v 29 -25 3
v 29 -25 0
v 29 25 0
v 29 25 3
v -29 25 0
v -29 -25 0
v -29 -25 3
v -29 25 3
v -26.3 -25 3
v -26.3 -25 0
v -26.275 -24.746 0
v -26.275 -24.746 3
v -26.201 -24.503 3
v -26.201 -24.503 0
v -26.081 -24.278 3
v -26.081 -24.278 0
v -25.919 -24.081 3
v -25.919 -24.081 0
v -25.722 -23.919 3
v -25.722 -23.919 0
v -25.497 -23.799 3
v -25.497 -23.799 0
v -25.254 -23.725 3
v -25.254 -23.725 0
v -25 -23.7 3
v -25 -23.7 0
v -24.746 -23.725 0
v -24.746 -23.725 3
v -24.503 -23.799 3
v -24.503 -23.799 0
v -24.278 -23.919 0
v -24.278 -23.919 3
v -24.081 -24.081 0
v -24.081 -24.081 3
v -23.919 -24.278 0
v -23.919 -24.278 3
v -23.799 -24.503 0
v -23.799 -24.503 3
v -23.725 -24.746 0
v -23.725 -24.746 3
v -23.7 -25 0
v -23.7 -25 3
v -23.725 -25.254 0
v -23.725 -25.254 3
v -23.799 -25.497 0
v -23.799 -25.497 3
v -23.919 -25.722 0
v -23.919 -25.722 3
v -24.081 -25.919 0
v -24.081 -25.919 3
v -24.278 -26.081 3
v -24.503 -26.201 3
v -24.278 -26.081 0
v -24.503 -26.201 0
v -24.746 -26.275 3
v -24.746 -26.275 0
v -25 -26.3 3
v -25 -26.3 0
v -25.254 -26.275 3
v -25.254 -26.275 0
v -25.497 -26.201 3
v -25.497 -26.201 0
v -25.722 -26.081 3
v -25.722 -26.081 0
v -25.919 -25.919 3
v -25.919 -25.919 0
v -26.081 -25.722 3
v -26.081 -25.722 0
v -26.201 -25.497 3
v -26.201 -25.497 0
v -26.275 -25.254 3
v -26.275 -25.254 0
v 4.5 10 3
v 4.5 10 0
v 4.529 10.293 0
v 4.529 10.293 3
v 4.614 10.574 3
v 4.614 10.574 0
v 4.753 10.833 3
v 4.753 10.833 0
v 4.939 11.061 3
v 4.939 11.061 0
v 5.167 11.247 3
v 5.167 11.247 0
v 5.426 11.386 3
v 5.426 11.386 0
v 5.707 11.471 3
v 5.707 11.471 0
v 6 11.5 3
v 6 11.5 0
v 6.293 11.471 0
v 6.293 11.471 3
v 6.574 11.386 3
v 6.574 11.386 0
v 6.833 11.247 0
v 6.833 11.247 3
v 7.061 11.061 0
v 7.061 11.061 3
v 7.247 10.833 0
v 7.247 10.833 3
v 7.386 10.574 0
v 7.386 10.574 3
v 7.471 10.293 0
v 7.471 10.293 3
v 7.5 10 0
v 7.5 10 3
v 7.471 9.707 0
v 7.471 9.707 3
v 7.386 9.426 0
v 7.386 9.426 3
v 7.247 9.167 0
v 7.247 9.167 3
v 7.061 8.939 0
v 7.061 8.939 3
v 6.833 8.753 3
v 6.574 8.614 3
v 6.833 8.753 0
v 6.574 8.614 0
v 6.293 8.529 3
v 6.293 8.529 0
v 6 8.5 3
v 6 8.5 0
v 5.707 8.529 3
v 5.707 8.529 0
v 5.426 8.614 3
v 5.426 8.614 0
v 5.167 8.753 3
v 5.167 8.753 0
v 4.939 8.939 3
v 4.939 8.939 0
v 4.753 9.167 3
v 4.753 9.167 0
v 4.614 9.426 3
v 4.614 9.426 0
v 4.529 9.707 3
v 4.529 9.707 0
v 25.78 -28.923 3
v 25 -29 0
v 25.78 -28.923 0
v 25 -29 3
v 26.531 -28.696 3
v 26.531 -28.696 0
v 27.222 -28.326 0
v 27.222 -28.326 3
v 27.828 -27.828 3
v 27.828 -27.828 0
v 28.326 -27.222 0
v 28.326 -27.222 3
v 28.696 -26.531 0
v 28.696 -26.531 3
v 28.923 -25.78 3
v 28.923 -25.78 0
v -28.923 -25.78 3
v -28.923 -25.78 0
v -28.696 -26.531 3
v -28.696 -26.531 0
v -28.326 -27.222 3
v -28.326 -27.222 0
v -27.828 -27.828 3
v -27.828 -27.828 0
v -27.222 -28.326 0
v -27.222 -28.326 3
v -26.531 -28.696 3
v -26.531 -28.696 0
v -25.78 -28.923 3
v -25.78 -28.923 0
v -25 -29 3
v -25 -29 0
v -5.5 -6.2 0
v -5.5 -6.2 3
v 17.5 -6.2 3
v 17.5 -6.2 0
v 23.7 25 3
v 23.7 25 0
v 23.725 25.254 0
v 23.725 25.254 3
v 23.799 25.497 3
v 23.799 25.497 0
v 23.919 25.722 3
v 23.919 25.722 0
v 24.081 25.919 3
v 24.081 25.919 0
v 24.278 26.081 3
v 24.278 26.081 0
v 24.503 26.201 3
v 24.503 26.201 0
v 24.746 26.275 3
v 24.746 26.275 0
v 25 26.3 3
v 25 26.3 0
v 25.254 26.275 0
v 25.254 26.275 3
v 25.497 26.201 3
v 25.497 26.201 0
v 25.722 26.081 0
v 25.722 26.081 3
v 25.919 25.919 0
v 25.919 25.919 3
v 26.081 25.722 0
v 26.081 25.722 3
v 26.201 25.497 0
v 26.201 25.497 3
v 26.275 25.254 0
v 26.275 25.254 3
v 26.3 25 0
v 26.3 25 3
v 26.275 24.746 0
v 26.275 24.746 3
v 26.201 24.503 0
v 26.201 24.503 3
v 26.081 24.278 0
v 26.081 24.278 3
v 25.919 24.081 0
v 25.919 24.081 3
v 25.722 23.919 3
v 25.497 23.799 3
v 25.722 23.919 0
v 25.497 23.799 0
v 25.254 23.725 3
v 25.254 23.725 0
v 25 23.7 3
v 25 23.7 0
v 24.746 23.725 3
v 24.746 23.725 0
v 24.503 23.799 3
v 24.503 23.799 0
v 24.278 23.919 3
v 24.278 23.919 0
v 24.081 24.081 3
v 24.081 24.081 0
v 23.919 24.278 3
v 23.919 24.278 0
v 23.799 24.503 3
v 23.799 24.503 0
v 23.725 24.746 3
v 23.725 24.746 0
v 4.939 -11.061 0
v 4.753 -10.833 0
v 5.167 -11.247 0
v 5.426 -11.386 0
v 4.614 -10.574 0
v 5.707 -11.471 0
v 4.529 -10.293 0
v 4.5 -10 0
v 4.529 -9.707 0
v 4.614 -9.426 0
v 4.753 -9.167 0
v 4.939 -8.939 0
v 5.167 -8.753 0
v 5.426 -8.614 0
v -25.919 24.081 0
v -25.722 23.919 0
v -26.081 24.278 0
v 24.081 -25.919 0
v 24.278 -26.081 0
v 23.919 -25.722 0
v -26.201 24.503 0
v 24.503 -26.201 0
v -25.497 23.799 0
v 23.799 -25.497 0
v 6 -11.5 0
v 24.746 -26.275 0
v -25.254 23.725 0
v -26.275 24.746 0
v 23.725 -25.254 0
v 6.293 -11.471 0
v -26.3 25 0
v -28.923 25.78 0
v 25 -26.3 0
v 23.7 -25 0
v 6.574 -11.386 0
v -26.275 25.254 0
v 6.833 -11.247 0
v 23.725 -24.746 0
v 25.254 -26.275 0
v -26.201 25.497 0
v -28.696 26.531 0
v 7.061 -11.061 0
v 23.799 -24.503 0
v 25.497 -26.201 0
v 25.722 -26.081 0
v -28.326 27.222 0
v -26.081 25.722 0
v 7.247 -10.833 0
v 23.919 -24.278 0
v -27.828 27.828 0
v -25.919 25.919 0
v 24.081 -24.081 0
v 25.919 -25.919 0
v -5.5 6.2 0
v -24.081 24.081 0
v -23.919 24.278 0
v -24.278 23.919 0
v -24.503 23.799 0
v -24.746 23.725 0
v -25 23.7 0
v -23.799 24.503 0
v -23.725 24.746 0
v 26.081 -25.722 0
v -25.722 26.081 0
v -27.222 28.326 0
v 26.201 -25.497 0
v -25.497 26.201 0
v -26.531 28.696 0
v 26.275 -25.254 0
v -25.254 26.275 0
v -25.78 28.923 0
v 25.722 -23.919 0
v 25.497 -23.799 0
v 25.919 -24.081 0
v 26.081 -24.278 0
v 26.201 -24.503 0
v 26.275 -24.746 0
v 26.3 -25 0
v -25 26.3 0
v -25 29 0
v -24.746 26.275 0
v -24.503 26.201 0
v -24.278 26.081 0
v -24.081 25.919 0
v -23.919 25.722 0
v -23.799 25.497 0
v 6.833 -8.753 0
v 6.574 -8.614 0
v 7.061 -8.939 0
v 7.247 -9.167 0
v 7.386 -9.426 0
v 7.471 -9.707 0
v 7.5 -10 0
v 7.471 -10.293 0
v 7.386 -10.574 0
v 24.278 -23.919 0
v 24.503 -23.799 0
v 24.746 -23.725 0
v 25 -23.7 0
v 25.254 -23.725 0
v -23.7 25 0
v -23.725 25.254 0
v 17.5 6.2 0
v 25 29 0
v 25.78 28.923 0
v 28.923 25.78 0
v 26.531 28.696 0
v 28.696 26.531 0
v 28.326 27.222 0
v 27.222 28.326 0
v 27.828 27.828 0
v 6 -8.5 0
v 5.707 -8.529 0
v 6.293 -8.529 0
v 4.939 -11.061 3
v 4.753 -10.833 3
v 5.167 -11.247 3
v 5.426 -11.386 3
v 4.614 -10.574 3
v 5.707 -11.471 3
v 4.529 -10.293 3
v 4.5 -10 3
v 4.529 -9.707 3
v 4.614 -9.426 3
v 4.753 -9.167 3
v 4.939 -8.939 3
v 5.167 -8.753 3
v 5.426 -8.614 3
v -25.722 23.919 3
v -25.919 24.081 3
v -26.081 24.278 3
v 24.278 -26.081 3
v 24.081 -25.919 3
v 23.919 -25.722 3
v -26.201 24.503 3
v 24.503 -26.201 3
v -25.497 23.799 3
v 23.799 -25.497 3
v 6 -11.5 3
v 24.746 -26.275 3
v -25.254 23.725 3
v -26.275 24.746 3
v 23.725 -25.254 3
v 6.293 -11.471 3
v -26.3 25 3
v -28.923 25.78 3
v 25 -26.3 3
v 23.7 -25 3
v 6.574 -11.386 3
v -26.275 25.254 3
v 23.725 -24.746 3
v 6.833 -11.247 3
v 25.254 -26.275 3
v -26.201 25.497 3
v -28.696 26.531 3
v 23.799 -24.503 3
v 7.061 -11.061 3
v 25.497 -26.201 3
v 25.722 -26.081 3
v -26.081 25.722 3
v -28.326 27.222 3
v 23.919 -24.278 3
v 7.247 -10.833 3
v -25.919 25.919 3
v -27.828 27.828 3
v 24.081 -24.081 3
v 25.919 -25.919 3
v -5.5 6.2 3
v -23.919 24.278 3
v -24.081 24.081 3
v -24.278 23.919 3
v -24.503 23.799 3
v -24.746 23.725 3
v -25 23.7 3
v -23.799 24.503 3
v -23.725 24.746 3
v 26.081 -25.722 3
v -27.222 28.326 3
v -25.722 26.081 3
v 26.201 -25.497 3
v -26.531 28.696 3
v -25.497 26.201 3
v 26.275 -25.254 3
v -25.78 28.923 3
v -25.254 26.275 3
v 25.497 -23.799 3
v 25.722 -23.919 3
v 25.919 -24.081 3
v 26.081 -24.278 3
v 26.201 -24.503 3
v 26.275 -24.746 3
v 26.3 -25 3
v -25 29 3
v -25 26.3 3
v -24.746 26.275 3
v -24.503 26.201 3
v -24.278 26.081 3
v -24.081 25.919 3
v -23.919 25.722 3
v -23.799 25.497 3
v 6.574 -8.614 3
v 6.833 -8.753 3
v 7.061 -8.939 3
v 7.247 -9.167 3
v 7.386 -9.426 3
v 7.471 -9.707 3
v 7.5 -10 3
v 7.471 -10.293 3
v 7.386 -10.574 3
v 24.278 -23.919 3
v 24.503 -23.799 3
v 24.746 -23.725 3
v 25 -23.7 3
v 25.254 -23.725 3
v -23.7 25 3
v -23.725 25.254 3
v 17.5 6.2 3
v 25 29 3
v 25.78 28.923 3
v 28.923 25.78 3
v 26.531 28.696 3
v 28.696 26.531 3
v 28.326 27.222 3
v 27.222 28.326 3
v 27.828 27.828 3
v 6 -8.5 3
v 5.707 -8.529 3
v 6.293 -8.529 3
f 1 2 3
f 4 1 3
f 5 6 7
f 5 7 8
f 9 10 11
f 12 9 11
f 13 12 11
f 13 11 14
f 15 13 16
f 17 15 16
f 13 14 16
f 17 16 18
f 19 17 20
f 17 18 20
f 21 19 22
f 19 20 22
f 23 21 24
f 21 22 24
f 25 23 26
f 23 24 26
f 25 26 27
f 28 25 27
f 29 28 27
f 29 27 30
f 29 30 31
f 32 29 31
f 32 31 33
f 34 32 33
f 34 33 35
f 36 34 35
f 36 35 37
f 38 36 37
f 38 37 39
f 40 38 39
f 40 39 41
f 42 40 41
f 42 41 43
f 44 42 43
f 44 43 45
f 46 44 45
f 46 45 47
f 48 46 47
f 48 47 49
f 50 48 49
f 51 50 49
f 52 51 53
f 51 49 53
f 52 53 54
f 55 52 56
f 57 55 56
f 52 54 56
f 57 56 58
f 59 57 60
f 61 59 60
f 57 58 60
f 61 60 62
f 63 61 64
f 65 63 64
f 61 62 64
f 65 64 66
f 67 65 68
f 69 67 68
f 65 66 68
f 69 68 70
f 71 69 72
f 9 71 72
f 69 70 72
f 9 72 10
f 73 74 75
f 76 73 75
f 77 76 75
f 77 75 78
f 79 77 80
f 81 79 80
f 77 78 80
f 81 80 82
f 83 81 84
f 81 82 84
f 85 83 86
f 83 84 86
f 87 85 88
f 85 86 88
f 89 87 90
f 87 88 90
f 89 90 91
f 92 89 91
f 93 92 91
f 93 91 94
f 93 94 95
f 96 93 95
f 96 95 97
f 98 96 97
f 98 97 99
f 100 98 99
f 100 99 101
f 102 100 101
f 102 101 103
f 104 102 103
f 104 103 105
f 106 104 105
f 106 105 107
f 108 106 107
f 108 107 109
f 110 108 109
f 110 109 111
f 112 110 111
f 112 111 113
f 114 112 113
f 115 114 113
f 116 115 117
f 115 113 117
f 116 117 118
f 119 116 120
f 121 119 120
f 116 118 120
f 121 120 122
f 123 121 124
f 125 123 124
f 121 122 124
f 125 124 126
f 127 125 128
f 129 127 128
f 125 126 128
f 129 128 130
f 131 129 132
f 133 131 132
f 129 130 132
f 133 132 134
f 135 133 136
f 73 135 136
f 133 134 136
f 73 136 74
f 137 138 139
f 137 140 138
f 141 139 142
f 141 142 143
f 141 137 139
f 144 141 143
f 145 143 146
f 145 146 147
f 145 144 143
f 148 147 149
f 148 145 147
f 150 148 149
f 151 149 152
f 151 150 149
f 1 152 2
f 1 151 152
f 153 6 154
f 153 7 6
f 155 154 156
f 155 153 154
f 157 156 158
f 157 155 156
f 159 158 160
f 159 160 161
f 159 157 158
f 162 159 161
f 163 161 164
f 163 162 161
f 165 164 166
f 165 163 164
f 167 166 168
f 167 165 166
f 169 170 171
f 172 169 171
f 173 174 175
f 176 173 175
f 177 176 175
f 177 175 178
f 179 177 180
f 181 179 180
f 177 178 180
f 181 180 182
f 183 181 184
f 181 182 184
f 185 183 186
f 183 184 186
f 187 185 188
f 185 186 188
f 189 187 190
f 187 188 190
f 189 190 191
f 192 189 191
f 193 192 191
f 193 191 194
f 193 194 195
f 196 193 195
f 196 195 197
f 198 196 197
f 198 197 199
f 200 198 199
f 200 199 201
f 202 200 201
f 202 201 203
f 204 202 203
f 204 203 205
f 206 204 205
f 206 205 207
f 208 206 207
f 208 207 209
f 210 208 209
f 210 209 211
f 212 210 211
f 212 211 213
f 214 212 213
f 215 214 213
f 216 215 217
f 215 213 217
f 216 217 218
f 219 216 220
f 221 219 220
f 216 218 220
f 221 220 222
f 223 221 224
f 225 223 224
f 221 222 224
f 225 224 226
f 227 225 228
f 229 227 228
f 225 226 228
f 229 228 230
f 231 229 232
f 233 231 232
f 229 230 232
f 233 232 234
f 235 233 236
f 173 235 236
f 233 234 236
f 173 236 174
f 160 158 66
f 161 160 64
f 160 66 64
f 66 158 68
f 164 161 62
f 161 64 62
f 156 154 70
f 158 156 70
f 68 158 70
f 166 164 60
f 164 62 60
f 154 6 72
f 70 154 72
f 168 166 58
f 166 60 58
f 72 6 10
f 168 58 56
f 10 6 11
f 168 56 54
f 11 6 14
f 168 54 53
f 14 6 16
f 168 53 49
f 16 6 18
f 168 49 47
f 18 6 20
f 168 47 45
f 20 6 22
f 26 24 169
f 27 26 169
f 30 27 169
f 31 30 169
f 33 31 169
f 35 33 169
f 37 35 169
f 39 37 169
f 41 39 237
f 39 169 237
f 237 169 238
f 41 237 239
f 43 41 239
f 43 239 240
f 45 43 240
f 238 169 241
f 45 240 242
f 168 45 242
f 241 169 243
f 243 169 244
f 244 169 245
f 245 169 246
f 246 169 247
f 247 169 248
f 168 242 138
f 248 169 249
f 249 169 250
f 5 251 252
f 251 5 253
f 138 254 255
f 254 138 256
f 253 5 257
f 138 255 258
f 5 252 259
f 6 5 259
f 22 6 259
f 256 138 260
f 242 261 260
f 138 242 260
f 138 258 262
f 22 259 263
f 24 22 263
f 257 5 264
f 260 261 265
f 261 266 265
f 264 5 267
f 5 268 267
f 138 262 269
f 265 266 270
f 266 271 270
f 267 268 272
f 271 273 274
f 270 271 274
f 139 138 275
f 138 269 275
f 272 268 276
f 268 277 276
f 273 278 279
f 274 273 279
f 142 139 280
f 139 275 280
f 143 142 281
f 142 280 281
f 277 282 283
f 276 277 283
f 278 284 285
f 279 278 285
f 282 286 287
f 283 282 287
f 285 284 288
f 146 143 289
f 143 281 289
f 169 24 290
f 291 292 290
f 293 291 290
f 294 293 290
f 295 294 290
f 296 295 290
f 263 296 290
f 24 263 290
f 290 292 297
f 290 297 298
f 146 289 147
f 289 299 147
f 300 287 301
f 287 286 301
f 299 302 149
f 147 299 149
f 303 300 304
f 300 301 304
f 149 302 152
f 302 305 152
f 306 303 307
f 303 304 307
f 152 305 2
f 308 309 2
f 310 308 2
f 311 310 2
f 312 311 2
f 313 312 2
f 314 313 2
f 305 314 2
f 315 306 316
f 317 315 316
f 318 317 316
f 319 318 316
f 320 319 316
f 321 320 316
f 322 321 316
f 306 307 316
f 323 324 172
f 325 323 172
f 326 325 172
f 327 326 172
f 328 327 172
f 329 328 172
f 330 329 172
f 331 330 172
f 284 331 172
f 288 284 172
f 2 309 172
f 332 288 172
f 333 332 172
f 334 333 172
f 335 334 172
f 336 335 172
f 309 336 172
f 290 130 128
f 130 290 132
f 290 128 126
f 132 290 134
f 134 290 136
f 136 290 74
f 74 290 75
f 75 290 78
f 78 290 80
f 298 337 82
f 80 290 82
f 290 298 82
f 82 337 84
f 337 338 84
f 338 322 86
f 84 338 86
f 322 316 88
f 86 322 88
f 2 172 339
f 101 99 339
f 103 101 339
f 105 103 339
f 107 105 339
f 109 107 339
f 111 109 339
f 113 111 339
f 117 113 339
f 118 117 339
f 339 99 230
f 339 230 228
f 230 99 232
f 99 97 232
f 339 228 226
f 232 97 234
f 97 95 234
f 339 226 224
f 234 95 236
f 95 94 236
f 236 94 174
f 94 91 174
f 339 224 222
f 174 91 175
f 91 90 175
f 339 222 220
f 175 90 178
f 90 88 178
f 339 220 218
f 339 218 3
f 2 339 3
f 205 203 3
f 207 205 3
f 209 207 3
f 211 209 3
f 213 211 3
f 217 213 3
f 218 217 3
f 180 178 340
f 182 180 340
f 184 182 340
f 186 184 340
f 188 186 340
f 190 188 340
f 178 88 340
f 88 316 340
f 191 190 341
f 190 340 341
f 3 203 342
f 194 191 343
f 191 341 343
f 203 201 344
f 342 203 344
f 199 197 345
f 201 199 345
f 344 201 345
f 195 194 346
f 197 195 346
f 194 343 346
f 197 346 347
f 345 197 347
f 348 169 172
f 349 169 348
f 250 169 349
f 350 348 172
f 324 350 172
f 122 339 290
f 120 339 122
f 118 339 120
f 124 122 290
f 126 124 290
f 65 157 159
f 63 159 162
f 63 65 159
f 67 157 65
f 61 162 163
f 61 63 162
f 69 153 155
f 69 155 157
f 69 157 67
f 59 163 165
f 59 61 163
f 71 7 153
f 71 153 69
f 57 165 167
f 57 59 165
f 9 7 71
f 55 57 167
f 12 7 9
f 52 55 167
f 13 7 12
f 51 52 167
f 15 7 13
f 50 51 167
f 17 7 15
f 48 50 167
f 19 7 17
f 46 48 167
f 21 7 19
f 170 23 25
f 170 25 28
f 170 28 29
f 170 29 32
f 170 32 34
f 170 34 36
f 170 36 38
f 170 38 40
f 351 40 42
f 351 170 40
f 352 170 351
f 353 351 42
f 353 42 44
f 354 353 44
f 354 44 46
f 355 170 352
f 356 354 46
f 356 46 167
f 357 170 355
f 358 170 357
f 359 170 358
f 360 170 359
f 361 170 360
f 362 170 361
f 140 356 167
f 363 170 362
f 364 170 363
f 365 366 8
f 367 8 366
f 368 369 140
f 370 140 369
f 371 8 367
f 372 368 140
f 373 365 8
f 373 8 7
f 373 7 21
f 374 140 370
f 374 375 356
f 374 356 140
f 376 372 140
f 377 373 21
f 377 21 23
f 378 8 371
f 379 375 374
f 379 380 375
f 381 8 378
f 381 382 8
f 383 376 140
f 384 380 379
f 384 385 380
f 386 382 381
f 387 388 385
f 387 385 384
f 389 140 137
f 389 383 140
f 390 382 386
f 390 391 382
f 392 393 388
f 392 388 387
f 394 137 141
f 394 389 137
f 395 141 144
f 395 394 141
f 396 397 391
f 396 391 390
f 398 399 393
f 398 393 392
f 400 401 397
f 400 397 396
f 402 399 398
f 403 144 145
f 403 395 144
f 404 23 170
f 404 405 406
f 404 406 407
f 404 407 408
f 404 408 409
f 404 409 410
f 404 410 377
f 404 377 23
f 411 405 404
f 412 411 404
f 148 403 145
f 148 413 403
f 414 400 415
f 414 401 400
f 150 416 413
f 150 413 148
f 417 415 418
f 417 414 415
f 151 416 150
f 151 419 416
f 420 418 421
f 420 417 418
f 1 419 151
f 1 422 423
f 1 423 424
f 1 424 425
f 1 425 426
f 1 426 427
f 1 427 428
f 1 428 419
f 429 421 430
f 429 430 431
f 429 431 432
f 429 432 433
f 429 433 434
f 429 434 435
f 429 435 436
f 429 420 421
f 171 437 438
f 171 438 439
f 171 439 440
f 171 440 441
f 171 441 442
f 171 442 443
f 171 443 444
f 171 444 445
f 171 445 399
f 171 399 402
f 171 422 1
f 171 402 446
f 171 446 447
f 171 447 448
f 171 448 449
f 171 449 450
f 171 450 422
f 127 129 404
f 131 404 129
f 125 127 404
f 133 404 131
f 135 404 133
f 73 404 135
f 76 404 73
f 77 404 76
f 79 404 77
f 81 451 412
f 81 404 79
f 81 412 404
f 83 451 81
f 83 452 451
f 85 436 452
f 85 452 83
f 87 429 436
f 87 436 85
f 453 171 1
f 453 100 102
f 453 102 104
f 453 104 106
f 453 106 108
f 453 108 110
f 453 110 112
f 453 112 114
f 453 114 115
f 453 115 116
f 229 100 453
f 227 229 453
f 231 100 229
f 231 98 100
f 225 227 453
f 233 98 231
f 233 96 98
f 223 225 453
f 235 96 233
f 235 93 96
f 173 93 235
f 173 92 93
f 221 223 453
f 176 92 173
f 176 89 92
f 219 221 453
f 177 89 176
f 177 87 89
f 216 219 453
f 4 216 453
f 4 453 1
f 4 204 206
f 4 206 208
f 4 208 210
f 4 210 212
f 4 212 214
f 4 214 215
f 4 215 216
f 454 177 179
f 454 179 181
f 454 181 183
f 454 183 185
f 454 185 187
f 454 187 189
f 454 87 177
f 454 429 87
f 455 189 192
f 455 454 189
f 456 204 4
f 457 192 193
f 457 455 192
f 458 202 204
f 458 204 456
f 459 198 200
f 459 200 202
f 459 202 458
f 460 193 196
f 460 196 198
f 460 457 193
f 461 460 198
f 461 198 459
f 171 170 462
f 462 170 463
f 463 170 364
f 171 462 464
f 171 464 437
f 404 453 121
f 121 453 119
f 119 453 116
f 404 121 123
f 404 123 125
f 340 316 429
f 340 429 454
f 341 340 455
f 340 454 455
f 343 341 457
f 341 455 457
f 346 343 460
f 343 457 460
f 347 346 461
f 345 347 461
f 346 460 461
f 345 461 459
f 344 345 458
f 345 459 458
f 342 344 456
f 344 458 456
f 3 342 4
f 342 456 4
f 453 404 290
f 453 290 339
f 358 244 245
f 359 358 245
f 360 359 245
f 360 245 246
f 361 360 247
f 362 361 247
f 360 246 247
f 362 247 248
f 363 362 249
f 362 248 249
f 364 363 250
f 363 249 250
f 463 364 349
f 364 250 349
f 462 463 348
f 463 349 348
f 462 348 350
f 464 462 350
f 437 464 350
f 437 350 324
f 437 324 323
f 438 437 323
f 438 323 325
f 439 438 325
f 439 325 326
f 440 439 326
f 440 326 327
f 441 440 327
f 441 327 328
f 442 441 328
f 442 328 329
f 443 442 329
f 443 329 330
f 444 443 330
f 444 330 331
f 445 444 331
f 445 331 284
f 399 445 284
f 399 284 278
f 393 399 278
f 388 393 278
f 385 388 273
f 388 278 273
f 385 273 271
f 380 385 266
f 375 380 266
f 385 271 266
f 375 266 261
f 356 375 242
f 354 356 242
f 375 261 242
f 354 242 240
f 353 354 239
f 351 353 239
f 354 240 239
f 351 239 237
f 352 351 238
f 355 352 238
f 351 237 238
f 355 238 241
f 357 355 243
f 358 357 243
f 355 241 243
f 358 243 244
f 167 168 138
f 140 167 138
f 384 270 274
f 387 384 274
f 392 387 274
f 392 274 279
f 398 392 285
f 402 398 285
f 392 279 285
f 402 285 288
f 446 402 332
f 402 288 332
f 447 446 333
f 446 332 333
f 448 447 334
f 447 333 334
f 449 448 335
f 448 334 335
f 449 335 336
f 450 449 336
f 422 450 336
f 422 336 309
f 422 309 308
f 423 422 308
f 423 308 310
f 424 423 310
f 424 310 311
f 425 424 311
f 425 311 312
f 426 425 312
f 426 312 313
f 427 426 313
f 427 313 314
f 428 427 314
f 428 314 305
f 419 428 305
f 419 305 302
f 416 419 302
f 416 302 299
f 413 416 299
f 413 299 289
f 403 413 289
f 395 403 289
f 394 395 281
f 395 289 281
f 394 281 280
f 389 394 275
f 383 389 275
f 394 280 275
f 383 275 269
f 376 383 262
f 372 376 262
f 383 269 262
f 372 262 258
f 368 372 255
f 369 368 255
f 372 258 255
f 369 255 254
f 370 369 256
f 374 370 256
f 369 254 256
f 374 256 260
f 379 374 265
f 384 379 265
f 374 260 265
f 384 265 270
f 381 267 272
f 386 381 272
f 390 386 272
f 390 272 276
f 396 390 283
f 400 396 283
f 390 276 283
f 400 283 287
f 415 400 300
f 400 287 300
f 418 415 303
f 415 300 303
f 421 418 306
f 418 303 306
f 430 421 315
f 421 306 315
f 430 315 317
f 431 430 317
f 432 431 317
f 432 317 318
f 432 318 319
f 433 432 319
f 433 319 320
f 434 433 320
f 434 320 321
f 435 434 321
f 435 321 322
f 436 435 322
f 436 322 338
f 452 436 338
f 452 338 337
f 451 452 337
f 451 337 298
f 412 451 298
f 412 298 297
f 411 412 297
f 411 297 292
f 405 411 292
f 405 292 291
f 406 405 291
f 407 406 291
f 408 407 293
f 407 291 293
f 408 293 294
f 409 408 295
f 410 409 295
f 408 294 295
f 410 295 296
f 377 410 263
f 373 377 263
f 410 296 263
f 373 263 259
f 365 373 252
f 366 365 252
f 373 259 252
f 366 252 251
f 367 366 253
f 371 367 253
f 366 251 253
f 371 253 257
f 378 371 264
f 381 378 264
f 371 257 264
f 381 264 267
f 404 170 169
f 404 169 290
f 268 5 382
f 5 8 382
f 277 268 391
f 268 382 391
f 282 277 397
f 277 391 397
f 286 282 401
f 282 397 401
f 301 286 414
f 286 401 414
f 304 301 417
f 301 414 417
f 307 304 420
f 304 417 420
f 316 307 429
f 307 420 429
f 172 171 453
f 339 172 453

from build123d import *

# Parameters (mm, degrees)
ESBO_O1_W                    = 58
ESBO_O1_H                    = 58
RESSALTO_EXTRUS_O1_DEPTH     = 3
FURO_DE_DI_METRO_2_6_2_6_1_D = 2.6
PERFIL_CORTE_W               = 23
PERFIL_CORTE_H               = 12.4
CORTE_PRINCIPAL_DEPTH        = 85.236965894
FURO_DE_DI_METRO_3_0_3_1_D   = 3
FILETE1_R                    = 4


with BuildPart() as part:
    # Esboço1 → Ressalto-extrusão1 (new body)
    with BuildSketch(Plane.XY):
        Rectangle(ESBO_O1_W, ESBO_O1_H)
    extrude(amount=RESSALTO_EXTRUS_O1_DEPTH)

    # Furo de diâmetro Ø2.6 (2.6)1 (through all)
    with Locations(Plane.XY.offset(3)):
        with Locations((-25, 25), (25, 25), (25, -25), (-25, -25)):
            Hole(FURO_DE_DI_METRO_2_6_2_6_1_D / 2)

    # Perfil Corte → Corte Principal (cut, through all)
    with BuildSketch(Plane(origin=(-34.608741594, -26.143398661, 3), x_dir=(1, 0, 0), z_dir=(0, 0, 1))):
        with Locations((40.608741594, 26.143398661)):
            Rectangle(PERFIL_CORTE_W, PERFIL_CORTE_H)
    extrude(amount=-CORTE_PRINCIPAL_DEPTH, mode=Mode.SUBTRACT)

    # Furo de diâmetro Ø3.0 (3)1 (through all)
    with Locations(Plane(origin=(-55.097814602, -24.42830067, 3), x_dir=(1, 0, 0), z_dir=(0, 0, 1))):
        with Locations((61.097814602, 34.42830067), (61.097814602, 14.42830067)):
            Hole(FURO_DE_DI_METRO_3_0_3_1_D / 2)

    # Filete1
    filete1_edges = [part.edges().sort_by_distance(p)[0] for p in [
        (29, -29, 1.5),
        (-29, -29, 1.5),
        (-29, 29, 1.5),
        (29, 29, 1.5),
    ]]
    fillet(filete1_edges, radius=FILETE1_R)


solid = part.part
